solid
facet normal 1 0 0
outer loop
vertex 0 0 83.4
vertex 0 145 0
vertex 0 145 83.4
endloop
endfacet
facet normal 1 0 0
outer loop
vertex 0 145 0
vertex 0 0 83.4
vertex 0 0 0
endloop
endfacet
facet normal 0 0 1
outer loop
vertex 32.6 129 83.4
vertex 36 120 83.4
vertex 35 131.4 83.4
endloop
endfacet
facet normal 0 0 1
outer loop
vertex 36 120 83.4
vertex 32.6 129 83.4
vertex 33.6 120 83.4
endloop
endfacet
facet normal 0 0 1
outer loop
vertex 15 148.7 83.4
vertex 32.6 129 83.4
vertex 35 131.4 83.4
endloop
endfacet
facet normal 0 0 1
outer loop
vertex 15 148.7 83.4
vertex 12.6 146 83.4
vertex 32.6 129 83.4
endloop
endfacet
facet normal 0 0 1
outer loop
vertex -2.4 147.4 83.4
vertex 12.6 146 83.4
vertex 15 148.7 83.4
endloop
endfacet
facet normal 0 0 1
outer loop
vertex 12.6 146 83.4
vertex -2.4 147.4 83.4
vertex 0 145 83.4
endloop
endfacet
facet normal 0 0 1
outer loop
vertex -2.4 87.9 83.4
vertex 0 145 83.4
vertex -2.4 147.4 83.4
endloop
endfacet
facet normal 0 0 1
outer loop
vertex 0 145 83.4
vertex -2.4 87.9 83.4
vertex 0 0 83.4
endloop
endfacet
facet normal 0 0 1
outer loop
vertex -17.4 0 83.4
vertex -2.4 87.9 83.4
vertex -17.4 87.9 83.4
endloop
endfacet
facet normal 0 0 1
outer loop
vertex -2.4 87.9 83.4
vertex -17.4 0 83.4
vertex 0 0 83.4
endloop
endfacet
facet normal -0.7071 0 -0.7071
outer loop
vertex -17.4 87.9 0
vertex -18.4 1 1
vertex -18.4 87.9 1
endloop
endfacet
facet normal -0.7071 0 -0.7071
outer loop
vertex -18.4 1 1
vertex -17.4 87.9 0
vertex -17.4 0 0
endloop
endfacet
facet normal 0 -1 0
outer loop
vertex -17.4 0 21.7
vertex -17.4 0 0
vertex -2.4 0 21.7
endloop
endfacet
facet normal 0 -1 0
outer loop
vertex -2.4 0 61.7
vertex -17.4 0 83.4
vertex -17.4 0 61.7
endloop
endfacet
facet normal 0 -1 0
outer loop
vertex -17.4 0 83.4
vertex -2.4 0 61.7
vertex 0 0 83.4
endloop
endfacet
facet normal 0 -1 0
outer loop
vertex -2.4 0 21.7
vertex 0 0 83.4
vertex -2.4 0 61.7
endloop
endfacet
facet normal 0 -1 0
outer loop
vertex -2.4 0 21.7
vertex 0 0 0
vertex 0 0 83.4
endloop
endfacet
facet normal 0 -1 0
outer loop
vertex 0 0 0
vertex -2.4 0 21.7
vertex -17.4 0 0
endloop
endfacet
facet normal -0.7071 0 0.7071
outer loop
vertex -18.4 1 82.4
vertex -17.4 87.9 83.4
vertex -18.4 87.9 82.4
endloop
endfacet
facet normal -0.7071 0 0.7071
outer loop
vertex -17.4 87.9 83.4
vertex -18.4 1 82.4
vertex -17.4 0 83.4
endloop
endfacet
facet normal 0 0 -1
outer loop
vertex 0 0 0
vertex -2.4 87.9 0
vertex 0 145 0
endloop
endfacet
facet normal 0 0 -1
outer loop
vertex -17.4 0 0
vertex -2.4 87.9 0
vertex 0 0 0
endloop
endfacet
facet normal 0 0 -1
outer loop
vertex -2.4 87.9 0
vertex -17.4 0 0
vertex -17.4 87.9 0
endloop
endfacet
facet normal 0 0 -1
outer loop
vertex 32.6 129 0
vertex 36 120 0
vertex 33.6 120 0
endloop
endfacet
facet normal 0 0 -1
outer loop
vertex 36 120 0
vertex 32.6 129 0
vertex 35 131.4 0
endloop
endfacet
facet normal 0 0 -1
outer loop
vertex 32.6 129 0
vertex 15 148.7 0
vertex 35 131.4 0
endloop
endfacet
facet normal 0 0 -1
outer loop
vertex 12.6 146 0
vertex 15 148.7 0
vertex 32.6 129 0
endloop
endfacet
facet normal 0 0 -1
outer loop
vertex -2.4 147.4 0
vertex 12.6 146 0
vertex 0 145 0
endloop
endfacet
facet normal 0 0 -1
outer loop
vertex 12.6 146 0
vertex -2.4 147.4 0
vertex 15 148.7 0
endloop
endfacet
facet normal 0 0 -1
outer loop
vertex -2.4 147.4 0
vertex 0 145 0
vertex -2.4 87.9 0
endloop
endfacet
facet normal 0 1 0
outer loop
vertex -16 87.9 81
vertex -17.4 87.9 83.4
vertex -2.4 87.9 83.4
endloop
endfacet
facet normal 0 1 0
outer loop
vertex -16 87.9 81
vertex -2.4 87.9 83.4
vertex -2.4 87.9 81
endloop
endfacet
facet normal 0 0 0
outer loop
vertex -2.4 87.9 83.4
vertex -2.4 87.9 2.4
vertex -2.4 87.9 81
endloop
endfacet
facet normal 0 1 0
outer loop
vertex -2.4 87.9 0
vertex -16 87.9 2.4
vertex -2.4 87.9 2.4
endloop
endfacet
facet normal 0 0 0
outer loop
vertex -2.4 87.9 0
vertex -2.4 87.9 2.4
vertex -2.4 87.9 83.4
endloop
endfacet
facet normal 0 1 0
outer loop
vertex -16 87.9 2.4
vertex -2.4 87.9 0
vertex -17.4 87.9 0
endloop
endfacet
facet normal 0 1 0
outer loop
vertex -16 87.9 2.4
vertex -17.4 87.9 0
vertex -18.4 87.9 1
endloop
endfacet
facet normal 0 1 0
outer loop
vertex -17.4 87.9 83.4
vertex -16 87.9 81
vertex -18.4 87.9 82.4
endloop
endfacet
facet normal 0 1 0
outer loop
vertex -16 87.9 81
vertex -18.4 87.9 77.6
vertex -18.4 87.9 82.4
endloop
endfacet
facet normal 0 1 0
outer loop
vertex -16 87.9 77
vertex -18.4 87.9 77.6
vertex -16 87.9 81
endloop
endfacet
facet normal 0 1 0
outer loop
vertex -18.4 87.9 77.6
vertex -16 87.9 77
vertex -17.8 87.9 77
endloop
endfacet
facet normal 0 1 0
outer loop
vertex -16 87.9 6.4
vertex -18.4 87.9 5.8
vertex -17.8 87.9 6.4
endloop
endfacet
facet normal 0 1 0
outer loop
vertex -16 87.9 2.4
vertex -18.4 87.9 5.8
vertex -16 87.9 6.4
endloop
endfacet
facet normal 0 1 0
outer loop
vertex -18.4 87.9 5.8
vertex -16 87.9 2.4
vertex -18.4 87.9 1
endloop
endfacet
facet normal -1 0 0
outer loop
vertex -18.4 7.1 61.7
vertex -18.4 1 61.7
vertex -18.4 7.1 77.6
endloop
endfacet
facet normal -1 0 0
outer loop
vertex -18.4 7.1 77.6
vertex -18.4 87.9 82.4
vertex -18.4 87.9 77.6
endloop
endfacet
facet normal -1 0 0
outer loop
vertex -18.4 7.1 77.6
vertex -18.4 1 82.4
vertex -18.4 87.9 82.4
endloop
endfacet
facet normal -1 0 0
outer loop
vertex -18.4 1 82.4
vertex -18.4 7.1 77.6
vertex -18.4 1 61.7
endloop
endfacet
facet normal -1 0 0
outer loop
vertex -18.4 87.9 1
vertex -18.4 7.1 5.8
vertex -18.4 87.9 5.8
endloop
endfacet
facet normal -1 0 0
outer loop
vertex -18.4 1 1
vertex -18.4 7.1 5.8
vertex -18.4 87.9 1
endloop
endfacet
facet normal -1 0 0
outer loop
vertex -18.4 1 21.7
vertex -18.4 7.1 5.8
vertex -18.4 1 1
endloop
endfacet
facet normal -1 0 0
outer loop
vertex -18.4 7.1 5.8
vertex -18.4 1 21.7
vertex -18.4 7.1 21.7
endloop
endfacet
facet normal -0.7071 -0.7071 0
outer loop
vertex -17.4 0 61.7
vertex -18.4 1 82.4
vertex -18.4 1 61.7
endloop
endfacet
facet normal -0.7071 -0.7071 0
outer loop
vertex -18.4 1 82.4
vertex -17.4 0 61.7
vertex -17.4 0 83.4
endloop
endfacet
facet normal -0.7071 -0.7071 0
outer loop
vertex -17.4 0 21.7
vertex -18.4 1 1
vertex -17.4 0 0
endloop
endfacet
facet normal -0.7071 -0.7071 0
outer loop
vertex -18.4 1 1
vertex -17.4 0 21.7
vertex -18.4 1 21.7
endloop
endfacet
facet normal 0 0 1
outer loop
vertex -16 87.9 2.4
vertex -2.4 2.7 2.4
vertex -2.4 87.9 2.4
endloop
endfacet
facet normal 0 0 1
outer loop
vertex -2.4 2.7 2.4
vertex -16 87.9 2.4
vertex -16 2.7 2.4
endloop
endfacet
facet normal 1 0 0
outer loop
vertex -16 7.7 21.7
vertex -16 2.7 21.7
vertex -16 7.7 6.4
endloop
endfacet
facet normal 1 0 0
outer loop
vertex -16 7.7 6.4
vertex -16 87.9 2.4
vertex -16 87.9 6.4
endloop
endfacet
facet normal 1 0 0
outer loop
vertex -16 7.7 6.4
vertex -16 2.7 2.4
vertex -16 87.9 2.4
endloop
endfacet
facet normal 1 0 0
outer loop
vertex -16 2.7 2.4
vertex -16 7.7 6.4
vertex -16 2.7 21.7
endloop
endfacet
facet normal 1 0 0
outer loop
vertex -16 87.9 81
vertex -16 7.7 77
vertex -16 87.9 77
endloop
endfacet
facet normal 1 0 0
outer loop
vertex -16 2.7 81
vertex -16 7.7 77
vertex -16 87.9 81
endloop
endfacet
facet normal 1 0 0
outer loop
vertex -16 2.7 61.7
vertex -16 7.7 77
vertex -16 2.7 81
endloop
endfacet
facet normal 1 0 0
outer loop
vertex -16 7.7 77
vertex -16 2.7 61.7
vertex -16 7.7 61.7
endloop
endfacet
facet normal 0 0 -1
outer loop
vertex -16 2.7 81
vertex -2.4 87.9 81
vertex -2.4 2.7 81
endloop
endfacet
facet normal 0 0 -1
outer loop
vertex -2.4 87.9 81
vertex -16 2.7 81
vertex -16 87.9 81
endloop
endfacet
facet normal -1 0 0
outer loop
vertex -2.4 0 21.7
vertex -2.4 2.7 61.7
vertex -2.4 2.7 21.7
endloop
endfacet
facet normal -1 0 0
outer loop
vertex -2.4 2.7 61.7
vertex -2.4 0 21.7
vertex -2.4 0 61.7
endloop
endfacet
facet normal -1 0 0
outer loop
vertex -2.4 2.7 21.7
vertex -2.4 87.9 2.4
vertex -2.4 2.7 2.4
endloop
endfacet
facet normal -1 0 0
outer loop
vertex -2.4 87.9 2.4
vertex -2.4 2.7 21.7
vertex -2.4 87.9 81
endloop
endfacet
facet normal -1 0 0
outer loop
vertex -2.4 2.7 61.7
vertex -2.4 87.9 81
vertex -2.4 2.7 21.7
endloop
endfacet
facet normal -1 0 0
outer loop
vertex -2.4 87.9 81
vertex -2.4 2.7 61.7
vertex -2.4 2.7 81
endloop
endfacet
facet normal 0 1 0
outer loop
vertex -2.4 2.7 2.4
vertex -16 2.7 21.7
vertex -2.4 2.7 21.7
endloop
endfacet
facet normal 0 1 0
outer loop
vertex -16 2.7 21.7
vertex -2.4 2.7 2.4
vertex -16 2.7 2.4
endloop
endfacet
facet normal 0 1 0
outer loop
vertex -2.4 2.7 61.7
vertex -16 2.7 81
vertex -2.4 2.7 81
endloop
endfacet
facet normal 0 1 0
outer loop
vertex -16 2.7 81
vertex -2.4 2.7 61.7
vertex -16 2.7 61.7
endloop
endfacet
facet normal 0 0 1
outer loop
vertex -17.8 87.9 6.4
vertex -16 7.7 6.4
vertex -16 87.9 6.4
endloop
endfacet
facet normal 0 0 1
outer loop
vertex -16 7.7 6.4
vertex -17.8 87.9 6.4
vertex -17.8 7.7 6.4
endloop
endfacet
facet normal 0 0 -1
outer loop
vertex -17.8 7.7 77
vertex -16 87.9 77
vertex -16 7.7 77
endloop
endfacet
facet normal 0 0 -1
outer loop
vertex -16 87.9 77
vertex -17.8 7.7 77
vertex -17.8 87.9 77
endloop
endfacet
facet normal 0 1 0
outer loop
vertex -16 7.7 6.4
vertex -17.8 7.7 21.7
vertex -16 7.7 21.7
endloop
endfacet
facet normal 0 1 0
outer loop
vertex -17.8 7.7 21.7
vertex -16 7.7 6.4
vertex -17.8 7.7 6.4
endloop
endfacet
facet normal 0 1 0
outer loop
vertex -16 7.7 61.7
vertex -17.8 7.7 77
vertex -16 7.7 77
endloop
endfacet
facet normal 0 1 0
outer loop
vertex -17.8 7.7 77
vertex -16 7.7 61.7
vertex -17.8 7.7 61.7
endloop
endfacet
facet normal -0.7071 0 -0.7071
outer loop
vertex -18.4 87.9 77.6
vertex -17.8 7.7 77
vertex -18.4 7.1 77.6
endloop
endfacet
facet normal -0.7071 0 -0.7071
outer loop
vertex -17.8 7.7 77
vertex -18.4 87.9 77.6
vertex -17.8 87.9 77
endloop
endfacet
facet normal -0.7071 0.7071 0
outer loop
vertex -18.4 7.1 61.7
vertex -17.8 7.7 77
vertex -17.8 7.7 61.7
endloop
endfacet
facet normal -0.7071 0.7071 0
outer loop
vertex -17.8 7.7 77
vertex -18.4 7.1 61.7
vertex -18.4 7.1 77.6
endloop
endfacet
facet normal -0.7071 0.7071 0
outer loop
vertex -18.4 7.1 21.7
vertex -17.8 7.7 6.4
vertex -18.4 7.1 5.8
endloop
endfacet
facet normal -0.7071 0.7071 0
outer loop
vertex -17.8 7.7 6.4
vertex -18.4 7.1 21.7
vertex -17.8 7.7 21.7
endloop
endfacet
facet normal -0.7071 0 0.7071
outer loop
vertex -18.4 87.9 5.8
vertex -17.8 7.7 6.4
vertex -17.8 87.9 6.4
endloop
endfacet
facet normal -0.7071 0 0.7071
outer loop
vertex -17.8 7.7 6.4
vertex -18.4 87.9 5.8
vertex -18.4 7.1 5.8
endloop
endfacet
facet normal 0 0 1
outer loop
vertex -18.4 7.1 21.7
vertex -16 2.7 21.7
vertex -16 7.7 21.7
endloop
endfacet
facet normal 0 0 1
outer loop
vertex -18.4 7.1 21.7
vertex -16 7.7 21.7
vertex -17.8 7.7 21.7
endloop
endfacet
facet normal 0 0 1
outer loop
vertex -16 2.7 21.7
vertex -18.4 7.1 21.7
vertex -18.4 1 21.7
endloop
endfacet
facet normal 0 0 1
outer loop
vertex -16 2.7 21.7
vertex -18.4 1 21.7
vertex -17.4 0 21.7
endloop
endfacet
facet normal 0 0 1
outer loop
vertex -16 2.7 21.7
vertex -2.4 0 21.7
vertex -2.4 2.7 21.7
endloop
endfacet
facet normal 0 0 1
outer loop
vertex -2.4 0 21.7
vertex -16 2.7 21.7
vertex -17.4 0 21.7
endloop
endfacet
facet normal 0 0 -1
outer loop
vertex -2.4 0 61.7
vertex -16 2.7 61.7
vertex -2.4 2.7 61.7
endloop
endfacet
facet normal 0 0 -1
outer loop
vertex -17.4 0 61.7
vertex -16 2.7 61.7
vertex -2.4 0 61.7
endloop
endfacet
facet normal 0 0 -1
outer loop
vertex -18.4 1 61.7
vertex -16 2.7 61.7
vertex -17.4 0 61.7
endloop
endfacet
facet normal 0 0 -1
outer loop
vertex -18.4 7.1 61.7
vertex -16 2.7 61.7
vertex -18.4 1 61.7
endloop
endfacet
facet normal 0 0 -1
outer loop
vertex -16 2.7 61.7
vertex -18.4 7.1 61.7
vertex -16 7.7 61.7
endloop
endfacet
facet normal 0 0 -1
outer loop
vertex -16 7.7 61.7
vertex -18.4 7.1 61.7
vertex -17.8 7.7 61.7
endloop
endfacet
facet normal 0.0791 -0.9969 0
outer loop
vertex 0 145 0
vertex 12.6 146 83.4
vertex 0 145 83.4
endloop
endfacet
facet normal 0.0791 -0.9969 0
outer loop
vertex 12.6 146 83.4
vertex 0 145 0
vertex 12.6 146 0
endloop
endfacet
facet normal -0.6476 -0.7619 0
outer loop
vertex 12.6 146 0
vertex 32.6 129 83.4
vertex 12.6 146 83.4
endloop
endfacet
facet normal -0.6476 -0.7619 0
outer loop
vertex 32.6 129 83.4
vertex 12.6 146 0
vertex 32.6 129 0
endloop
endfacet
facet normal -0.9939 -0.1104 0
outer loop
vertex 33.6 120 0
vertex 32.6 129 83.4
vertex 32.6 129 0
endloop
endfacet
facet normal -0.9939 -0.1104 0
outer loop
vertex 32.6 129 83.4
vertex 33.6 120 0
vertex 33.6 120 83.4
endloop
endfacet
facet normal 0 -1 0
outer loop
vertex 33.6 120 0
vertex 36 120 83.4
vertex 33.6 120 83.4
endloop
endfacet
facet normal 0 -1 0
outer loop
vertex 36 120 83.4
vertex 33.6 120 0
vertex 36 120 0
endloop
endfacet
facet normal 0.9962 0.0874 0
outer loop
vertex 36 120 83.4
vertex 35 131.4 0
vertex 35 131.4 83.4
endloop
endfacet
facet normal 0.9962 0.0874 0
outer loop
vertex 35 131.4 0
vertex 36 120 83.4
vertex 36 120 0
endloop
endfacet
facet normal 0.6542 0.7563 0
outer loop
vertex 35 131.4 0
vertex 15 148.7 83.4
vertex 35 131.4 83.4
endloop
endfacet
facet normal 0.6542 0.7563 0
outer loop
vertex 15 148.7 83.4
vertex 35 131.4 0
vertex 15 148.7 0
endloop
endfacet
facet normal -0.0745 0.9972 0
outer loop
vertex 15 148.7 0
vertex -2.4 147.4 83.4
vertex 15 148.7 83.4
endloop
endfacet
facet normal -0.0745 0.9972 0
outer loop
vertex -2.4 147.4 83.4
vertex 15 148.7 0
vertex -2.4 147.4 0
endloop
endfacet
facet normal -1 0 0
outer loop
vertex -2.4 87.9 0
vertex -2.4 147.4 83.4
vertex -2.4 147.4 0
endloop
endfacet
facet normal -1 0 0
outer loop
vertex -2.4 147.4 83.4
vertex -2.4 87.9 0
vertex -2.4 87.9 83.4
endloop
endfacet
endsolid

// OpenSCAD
// ===== PARAMETERS ===== //

/* [Parts] */
item_parts = 0; // [0:Complete, 1:Holder Test, 2:Bracket Test, 3:Test]

/* [Phone Dimension] */
// Width of Phone
phone_width = 77;  
// Thickness of Phone
phone_thickness = 12;  
// Length from bottom of phone to just below first buttons on the sides
holder_length = 85;  
// Width of holder in front of the phone
holder_side_edge = 4;
// Height of the holder in front of the phone
holder_bottom_edge = 5;
// Cutout in bottom for USB connector
holder_usb_cutout = 40;

/* [General] */
// Thickness of felt or padding between bracket and screen
felt_thickness = 2;
// Length from bottom of holder to top
full_length = 145;

/* [Magins and tweaks] */
// Inside margin between phone and holder
phone_holder_margin = 0.5;
// Thickness of walls
wall_thickness = 2.4;
// Dimensional accuracy
dim_acc = 0.3;

// ===== IMPLEMENTATION ===== //

select_item_part();

module select_item_part() {
    if (item_parts == 0)
        complete();
    else if (item_parts == 1)
        test_holder();
    else if (item_parts == 2)
        test_bracket();
}

module test() {
    
}

module test_holder() {
    // Use this for making a test print of the holder, in order to check phone measurements and fit.
    
    difference() {
        holder();
    
        translate([-20,20,-10])
        linear_extrude(phone_width*2)
        square([phone_thickness*2, holder_length], center = false);

    }    
}

module test_bracket() {
    // Use for test printing the bracket for fit and if needed adjust the full length based on how high or low you want the phone to hang.
    
    bracket(5);
}

module complete() {
    union() {
        main_bracket();
        holder();
    }
}

module holder() {
    
    // This forms the cup at the bottom which holds the mobile phone in place.
    
    // holder outside width
    hw = phone_width + wall_thickness*2+phone_holder_margin*2+dim_acc*2;
    
    // holder outside thickness
    ht = phone_thickness + wall_thickness*2+phone_holder_margin*2+dim_acc*2;
    
    // holder outside length
    hl = holder_length + wall_thickness + phone_holder_margin;

    // holder inside dimensions
    ihw = hw - wall_thickness*2;
    iht = ht - wall_thickness*2;
    ihl = hl - wall_thickness;
        
    difference() {
        // Outside holder with simple beveled edges
        hull() {
            translate([-ht+1,0,0])
            linear_extrude(hw)
            square([ht-1,hl], center = false);

            translate([-ht,1,1])
            linear_extrude(hw-2)
            square([ht,hl-1], center = false);
        }
        
        // Cut out the inside of the holder
        
        translate([-iht-wall_thickness,wall_thickness+dim_acc,wall_thickness])
        linear_extrude(ihw)
        square([iht, ihl], center = false);
        
         // Cut out the front
        translate([-iht-wall_thickness*3,wall_thickness+dim_acc+holder_bottom_edge,wall_thickness+holder_side_edge])
        linear_extrude(ihw-holder_side_edge*2)
        square([iht, ihl-holder_bottom_edge], center = false);

        // Do a slight bevel
        translate([-1,0,0])
        hull() {
            translate([-iht-wall_thickness*3+2,wall_thickness+dim_acc+holder_bottom_edge,wall_thickness+holder_side_edge])
            linear_extrude(ihw-holder_side_edge*2)
            square([2, ihl-holder_bottom_edge], center = false);

            translate([-iht-wall_thickness*3+2,wall_thickness+dim_acc+holder_bottom_edge-1,wall_thickness+holder_side_edge-1])
            linear_extrude(ihw-holder_side_edge*2+2)
            square([1, ihl-holder_bottom_edge+1], center = false);
        }

        // Cut out USB connector
        translate([-ht-wall_thickness,-1,hw/2-holder_usb_cutout/2])
        linear_extrude(holder_usb_cutout)
        square([ht,holder_bottom_edge*2], center = false);
       
    }

     
}

module main_bracket() {    
    // holder outside width
    hw = phone_width + wall_thickness*2+phone_holder_margin*2+dim_acc*2;
    
    bracket(hw);
}

module bracket(hw) {
    // Model the main bracket as a profile of the bracket using a polygon that is then extruded. This forms the back and hook.
    
    linear_extrude(hw)
    polygon(points=[
    [0,0],
    [0,full_length], 
    [10+felt_thickness+dim_acc*2,full_length+1],
    [30+felt_thickness+dim_acc*2,full_length-16],
    [31+felt_thickness+dim_acc*2,full_length-16-9],
    [31+felt_thickness+dim_acc*2+wall_thickness,full_length-16-9],
    [30+felt_thickness+dim_acc*2+wall_thickness,full_length-16+wall_thickness],
    [10+felt_thickness+dim_acc*2+wall_thickness,full_length+1+wall_thickness+dim_acc],
    [-wall_thickness,full_length+wall_thickness],
    [-wall_thickness,0]
    ]);    
}
